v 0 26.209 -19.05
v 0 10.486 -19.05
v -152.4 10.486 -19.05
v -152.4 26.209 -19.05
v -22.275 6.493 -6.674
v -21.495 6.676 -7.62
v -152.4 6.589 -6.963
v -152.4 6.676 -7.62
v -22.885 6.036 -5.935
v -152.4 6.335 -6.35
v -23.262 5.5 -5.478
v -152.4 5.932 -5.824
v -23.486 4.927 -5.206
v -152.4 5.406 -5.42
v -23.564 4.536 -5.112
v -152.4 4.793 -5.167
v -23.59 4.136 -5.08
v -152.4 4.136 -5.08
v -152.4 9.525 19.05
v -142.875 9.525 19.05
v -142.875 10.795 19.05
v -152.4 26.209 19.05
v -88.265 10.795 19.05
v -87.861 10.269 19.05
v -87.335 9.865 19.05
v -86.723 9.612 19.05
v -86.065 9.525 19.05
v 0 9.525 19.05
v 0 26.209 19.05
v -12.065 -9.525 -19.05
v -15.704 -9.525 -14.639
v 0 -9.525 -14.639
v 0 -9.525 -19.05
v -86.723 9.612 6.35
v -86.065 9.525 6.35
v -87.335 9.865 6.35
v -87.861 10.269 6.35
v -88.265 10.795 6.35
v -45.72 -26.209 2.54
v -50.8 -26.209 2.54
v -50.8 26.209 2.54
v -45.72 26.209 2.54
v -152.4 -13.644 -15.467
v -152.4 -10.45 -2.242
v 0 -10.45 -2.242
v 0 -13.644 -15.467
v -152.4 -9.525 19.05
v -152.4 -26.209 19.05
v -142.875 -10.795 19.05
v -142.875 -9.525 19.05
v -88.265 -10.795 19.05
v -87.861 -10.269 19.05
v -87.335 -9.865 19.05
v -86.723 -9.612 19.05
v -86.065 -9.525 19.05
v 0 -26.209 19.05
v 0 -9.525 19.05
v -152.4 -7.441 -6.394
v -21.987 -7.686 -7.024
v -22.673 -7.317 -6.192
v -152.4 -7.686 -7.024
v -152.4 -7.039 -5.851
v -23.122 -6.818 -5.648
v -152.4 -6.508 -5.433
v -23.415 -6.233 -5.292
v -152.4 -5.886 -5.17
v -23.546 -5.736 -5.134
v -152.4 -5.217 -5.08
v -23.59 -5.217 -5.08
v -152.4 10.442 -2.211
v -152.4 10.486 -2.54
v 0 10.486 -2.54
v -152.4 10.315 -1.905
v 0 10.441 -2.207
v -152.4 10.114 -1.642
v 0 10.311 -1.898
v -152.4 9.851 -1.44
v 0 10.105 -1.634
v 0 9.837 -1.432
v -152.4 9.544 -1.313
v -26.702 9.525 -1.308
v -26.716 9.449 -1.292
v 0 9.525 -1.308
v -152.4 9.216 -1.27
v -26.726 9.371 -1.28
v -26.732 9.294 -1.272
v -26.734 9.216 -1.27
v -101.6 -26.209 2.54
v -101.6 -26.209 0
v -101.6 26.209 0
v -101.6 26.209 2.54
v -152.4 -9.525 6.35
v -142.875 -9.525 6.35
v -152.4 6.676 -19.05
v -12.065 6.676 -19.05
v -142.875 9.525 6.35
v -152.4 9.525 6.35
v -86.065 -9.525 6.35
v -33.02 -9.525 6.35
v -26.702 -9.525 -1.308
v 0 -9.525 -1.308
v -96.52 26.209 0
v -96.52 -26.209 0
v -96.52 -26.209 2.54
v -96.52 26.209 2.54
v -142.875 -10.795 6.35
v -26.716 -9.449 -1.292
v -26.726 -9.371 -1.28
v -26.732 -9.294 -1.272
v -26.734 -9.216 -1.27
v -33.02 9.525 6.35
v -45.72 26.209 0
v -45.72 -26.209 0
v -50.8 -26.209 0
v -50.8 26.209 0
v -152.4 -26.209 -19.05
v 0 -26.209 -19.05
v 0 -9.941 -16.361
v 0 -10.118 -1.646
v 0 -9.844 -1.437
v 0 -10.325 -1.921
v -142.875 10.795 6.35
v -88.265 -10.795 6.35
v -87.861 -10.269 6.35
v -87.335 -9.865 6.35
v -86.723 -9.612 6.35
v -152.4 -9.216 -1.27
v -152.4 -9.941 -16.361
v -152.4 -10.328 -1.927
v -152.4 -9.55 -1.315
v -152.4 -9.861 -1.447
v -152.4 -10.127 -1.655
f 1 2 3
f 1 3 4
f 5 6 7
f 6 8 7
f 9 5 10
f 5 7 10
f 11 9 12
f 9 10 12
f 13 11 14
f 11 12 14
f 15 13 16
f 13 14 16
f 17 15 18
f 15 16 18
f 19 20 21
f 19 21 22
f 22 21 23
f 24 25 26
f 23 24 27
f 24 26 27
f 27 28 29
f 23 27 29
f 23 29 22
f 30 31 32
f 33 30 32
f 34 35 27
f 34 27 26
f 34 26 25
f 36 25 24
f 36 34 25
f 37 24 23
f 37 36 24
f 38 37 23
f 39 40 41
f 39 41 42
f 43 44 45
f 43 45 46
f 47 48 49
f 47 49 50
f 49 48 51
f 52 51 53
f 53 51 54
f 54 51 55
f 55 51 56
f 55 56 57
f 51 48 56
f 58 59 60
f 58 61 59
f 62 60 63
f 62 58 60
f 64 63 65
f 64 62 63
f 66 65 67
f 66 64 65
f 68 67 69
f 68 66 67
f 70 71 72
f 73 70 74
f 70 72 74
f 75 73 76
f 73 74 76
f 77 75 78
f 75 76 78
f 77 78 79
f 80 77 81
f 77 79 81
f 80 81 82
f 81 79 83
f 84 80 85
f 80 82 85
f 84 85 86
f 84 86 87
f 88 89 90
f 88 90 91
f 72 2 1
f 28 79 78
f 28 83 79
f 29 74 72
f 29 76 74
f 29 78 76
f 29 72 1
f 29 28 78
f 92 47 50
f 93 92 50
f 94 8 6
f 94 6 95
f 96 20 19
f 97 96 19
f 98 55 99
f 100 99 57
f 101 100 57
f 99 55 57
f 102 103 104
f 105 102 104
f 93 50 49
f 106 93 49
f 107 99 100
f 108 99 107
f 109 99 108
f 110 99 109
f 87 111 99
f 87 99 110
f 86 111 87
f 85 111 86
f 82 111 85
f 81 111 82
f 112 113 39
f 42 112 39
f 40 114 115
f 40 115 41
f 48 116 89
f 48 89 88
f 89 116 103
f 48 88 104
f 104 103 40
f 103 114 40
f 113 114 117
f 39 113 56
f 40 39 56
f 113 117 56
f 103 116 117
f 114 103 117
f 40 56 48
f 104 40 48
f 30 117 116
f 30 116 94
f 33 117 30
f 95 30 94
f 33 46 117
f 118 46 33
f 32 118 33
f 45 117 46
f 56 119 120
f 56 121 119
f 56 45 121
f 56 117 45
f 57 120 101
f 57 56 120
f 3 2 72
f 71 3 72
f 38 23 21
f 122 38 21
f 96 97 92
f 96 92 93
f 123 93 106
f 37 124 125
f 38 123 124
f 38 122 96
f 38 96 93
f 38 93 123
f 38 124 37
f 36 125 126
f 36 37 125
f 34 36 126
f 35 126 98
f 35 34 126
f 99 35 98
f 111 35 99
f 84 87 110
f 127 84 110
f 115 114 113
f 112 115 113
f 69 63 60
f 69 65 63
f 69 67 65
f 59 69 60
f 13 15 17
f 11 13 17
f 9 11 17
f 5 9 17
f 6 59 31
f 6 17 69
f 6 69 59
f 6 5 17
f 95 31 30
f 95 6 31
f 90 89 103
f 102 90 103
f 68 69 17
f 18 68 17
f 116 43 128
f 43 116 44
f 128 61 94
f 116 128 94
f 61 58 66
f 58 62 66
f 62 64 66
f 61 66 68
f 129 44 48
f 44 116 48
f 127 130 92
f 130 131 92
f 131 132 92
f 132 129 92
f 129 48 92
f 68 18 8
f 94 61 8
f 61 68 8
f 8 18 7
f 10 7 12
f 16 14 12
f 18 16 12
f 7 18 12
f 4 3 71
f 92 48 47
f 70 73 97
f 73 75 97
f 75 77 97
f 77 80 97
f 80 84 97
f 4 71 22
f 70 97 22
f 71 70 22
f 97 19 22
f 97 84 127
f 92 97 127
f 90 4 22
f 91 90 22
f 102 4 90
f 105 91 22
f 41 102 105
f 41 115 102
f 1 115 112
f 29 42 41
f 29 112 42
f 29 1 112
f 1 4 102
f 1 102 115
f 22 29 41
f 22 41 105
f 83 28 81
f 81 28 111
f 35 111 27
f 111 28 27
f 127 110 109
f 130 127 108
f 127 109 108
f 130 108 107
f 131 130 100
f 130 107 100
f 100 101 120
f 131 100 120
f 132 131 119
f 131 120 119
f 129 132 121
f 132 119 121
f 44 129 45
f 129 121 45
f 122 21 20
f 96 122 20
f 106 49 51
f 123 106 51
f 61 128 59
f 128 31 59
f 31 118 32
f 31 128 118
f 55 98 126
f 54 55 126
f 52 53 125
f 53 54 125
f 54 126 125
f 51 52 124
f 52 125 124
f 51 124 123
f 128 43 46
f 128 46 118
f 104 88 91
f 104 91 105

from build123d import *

# Parameters (mm, degrees)
F0_W         = 52.4178380828
F0_H         = 38.1
F1_DEPTH     = 152.4
F3_DEPTH     = 152.401
F5_DEPTH     = 12.7
F7_DEPTH     = 19.05
F8_W         = 5.08
F8_H         = 2.54
F9_DEPTH     = 52.4188380828
F10_R        = 2.54
F11_T1_DEPTH = 18.199261314


# Not quite as in the source:
# - a fillet or chamfer that OpenCascade refuses, or shapes differently, is made with other operations: its cross-section is extruded or revolved along the edge and cut away or added


with BuildPart() as f1:
    # F0 (on Right) → F1 (new body)
    with BuildSketch(Plane.YZ):
        Rectangle(F0_W, F0_H)
    extrude(amount=-F1_DEPTH)

    # F2 (on face) → F3 (cut, through all)
    with BuildSketch(Plane.YZ):
        with BuildLine():
            Line((6.6756140975, -19.05), (10.4856140975, -19.05))
            Line((10.4856140975, -19.05), (10.4856140975, -2.54))
            ThreePointArc((10.4856140975, -2.54), (10.1136397096, -1.6419743879), (9.2156140975, -1.27))
            Line((9.2156140975, -1.27), (-9.2156140975, -1.27))
            ThreePointArc((-9.2156140975, -1.27), (-10.0011773128, -1.5421070023), (-10.4501149349, -2.241826087))
            Line((-10.4501149349, -2.241826087), (-13.6443859025, -15.4667596303))
            Line((-13.6443859025, -15.4667596303), (-9.9408833902, -16.3612813694))
            Line((-9.9408833902, -16.3612813694), (-7.2160704876, -5.08))
            Line((-7.2160704876, -5.08), (6.6756140975, -5.08))
            Line((6.6756140975, -5.08), (6.6756140975, -19.05))
        make_face()
    extrude(amount=-F3_DEPTH, mode=Mode.SUBTRACT)

    # F4 (on face) → F5 (cut)
    with BuildSketch(Plane.XY.offset(19.05)):
        Polygon((-142.875, -10.795), (-88.265, -10.795), (-88.265, -9.525), (0, -9.525), (0, 9.525), (-88.265, 9.525), (-88.265, 10.795), (-142.875, 10.795), (-142.875, 9.525), (-152.4, 9.525), (-152.4, -9.525), (-142.875, -9.525), align=None)
    extrude(amount=-F5_DEPTH, mode=Mode.SUBTRACT)

    # F6 (on face) → F7 (cut, through all)
    with BuildSketch(Plane.XZ.offset(-9.525)):
        Polygon((0, 6.35), (-33.02, 6.35), (-12.065, -19.05), (0, -19.05), align=None)
    extrude(amount=F7_DEPTH, mode=Mode.SUBTRACT)

    # F8 (on face) → F9 (cut, through all)
    with BuildSketch(Plane.XZ.offset(26.2089190414)):
        with Locations((-99.06, 1.27)):
            Rectangle(F8_W, F8_H)
        with Locations((-48.26, 1.27)):
            Rectangle(F8_W, F8_H)
    extrude(amount=-F9_DEPTH, mode=Mode.SUBTRACT)

    # F10
    f10_edges = [f1.edges().sort_by_distance(p)[0] for p in [
        (-87.995125, -7.21607, -5.08),
        (-87.995125, 6.675614, -5.08),
    ]]
    fillet(f10_edges, radius=F10_R)

    # F11: fillet of radius 2.54 on 2 edges, made by hand

    # F11_s2 → F11_t1 (cut)
    with BuildSketch(Plane.XY.offset(6.35)):
        with BuildLine():
            ThreePointArc((-86.0652954744, -9.525), (-87.3352954744, -9.8652954744), (-88.265, -10.795))
            Line((-88.265, -10.795), (-88.265, -9.525))
            Line((-88.265, -9.525), (-86.0652954744, -9.525))
        make_face()
        with BuildLine():
            ThreePointArc((-86.0652954744, 9.525), (-87.3352954744, 9.8652954744), (-88.265, 10.795))
            Line((-88.265, 10.795), (-88.265, 9.525))
            Line((-88.265, 9.525), (-86.0652954744, 9.525))
        make_face()
    extrude(amount=F11_T1_DEPTH, mode=Mode.SUBTRACT)


solid = f1.part
